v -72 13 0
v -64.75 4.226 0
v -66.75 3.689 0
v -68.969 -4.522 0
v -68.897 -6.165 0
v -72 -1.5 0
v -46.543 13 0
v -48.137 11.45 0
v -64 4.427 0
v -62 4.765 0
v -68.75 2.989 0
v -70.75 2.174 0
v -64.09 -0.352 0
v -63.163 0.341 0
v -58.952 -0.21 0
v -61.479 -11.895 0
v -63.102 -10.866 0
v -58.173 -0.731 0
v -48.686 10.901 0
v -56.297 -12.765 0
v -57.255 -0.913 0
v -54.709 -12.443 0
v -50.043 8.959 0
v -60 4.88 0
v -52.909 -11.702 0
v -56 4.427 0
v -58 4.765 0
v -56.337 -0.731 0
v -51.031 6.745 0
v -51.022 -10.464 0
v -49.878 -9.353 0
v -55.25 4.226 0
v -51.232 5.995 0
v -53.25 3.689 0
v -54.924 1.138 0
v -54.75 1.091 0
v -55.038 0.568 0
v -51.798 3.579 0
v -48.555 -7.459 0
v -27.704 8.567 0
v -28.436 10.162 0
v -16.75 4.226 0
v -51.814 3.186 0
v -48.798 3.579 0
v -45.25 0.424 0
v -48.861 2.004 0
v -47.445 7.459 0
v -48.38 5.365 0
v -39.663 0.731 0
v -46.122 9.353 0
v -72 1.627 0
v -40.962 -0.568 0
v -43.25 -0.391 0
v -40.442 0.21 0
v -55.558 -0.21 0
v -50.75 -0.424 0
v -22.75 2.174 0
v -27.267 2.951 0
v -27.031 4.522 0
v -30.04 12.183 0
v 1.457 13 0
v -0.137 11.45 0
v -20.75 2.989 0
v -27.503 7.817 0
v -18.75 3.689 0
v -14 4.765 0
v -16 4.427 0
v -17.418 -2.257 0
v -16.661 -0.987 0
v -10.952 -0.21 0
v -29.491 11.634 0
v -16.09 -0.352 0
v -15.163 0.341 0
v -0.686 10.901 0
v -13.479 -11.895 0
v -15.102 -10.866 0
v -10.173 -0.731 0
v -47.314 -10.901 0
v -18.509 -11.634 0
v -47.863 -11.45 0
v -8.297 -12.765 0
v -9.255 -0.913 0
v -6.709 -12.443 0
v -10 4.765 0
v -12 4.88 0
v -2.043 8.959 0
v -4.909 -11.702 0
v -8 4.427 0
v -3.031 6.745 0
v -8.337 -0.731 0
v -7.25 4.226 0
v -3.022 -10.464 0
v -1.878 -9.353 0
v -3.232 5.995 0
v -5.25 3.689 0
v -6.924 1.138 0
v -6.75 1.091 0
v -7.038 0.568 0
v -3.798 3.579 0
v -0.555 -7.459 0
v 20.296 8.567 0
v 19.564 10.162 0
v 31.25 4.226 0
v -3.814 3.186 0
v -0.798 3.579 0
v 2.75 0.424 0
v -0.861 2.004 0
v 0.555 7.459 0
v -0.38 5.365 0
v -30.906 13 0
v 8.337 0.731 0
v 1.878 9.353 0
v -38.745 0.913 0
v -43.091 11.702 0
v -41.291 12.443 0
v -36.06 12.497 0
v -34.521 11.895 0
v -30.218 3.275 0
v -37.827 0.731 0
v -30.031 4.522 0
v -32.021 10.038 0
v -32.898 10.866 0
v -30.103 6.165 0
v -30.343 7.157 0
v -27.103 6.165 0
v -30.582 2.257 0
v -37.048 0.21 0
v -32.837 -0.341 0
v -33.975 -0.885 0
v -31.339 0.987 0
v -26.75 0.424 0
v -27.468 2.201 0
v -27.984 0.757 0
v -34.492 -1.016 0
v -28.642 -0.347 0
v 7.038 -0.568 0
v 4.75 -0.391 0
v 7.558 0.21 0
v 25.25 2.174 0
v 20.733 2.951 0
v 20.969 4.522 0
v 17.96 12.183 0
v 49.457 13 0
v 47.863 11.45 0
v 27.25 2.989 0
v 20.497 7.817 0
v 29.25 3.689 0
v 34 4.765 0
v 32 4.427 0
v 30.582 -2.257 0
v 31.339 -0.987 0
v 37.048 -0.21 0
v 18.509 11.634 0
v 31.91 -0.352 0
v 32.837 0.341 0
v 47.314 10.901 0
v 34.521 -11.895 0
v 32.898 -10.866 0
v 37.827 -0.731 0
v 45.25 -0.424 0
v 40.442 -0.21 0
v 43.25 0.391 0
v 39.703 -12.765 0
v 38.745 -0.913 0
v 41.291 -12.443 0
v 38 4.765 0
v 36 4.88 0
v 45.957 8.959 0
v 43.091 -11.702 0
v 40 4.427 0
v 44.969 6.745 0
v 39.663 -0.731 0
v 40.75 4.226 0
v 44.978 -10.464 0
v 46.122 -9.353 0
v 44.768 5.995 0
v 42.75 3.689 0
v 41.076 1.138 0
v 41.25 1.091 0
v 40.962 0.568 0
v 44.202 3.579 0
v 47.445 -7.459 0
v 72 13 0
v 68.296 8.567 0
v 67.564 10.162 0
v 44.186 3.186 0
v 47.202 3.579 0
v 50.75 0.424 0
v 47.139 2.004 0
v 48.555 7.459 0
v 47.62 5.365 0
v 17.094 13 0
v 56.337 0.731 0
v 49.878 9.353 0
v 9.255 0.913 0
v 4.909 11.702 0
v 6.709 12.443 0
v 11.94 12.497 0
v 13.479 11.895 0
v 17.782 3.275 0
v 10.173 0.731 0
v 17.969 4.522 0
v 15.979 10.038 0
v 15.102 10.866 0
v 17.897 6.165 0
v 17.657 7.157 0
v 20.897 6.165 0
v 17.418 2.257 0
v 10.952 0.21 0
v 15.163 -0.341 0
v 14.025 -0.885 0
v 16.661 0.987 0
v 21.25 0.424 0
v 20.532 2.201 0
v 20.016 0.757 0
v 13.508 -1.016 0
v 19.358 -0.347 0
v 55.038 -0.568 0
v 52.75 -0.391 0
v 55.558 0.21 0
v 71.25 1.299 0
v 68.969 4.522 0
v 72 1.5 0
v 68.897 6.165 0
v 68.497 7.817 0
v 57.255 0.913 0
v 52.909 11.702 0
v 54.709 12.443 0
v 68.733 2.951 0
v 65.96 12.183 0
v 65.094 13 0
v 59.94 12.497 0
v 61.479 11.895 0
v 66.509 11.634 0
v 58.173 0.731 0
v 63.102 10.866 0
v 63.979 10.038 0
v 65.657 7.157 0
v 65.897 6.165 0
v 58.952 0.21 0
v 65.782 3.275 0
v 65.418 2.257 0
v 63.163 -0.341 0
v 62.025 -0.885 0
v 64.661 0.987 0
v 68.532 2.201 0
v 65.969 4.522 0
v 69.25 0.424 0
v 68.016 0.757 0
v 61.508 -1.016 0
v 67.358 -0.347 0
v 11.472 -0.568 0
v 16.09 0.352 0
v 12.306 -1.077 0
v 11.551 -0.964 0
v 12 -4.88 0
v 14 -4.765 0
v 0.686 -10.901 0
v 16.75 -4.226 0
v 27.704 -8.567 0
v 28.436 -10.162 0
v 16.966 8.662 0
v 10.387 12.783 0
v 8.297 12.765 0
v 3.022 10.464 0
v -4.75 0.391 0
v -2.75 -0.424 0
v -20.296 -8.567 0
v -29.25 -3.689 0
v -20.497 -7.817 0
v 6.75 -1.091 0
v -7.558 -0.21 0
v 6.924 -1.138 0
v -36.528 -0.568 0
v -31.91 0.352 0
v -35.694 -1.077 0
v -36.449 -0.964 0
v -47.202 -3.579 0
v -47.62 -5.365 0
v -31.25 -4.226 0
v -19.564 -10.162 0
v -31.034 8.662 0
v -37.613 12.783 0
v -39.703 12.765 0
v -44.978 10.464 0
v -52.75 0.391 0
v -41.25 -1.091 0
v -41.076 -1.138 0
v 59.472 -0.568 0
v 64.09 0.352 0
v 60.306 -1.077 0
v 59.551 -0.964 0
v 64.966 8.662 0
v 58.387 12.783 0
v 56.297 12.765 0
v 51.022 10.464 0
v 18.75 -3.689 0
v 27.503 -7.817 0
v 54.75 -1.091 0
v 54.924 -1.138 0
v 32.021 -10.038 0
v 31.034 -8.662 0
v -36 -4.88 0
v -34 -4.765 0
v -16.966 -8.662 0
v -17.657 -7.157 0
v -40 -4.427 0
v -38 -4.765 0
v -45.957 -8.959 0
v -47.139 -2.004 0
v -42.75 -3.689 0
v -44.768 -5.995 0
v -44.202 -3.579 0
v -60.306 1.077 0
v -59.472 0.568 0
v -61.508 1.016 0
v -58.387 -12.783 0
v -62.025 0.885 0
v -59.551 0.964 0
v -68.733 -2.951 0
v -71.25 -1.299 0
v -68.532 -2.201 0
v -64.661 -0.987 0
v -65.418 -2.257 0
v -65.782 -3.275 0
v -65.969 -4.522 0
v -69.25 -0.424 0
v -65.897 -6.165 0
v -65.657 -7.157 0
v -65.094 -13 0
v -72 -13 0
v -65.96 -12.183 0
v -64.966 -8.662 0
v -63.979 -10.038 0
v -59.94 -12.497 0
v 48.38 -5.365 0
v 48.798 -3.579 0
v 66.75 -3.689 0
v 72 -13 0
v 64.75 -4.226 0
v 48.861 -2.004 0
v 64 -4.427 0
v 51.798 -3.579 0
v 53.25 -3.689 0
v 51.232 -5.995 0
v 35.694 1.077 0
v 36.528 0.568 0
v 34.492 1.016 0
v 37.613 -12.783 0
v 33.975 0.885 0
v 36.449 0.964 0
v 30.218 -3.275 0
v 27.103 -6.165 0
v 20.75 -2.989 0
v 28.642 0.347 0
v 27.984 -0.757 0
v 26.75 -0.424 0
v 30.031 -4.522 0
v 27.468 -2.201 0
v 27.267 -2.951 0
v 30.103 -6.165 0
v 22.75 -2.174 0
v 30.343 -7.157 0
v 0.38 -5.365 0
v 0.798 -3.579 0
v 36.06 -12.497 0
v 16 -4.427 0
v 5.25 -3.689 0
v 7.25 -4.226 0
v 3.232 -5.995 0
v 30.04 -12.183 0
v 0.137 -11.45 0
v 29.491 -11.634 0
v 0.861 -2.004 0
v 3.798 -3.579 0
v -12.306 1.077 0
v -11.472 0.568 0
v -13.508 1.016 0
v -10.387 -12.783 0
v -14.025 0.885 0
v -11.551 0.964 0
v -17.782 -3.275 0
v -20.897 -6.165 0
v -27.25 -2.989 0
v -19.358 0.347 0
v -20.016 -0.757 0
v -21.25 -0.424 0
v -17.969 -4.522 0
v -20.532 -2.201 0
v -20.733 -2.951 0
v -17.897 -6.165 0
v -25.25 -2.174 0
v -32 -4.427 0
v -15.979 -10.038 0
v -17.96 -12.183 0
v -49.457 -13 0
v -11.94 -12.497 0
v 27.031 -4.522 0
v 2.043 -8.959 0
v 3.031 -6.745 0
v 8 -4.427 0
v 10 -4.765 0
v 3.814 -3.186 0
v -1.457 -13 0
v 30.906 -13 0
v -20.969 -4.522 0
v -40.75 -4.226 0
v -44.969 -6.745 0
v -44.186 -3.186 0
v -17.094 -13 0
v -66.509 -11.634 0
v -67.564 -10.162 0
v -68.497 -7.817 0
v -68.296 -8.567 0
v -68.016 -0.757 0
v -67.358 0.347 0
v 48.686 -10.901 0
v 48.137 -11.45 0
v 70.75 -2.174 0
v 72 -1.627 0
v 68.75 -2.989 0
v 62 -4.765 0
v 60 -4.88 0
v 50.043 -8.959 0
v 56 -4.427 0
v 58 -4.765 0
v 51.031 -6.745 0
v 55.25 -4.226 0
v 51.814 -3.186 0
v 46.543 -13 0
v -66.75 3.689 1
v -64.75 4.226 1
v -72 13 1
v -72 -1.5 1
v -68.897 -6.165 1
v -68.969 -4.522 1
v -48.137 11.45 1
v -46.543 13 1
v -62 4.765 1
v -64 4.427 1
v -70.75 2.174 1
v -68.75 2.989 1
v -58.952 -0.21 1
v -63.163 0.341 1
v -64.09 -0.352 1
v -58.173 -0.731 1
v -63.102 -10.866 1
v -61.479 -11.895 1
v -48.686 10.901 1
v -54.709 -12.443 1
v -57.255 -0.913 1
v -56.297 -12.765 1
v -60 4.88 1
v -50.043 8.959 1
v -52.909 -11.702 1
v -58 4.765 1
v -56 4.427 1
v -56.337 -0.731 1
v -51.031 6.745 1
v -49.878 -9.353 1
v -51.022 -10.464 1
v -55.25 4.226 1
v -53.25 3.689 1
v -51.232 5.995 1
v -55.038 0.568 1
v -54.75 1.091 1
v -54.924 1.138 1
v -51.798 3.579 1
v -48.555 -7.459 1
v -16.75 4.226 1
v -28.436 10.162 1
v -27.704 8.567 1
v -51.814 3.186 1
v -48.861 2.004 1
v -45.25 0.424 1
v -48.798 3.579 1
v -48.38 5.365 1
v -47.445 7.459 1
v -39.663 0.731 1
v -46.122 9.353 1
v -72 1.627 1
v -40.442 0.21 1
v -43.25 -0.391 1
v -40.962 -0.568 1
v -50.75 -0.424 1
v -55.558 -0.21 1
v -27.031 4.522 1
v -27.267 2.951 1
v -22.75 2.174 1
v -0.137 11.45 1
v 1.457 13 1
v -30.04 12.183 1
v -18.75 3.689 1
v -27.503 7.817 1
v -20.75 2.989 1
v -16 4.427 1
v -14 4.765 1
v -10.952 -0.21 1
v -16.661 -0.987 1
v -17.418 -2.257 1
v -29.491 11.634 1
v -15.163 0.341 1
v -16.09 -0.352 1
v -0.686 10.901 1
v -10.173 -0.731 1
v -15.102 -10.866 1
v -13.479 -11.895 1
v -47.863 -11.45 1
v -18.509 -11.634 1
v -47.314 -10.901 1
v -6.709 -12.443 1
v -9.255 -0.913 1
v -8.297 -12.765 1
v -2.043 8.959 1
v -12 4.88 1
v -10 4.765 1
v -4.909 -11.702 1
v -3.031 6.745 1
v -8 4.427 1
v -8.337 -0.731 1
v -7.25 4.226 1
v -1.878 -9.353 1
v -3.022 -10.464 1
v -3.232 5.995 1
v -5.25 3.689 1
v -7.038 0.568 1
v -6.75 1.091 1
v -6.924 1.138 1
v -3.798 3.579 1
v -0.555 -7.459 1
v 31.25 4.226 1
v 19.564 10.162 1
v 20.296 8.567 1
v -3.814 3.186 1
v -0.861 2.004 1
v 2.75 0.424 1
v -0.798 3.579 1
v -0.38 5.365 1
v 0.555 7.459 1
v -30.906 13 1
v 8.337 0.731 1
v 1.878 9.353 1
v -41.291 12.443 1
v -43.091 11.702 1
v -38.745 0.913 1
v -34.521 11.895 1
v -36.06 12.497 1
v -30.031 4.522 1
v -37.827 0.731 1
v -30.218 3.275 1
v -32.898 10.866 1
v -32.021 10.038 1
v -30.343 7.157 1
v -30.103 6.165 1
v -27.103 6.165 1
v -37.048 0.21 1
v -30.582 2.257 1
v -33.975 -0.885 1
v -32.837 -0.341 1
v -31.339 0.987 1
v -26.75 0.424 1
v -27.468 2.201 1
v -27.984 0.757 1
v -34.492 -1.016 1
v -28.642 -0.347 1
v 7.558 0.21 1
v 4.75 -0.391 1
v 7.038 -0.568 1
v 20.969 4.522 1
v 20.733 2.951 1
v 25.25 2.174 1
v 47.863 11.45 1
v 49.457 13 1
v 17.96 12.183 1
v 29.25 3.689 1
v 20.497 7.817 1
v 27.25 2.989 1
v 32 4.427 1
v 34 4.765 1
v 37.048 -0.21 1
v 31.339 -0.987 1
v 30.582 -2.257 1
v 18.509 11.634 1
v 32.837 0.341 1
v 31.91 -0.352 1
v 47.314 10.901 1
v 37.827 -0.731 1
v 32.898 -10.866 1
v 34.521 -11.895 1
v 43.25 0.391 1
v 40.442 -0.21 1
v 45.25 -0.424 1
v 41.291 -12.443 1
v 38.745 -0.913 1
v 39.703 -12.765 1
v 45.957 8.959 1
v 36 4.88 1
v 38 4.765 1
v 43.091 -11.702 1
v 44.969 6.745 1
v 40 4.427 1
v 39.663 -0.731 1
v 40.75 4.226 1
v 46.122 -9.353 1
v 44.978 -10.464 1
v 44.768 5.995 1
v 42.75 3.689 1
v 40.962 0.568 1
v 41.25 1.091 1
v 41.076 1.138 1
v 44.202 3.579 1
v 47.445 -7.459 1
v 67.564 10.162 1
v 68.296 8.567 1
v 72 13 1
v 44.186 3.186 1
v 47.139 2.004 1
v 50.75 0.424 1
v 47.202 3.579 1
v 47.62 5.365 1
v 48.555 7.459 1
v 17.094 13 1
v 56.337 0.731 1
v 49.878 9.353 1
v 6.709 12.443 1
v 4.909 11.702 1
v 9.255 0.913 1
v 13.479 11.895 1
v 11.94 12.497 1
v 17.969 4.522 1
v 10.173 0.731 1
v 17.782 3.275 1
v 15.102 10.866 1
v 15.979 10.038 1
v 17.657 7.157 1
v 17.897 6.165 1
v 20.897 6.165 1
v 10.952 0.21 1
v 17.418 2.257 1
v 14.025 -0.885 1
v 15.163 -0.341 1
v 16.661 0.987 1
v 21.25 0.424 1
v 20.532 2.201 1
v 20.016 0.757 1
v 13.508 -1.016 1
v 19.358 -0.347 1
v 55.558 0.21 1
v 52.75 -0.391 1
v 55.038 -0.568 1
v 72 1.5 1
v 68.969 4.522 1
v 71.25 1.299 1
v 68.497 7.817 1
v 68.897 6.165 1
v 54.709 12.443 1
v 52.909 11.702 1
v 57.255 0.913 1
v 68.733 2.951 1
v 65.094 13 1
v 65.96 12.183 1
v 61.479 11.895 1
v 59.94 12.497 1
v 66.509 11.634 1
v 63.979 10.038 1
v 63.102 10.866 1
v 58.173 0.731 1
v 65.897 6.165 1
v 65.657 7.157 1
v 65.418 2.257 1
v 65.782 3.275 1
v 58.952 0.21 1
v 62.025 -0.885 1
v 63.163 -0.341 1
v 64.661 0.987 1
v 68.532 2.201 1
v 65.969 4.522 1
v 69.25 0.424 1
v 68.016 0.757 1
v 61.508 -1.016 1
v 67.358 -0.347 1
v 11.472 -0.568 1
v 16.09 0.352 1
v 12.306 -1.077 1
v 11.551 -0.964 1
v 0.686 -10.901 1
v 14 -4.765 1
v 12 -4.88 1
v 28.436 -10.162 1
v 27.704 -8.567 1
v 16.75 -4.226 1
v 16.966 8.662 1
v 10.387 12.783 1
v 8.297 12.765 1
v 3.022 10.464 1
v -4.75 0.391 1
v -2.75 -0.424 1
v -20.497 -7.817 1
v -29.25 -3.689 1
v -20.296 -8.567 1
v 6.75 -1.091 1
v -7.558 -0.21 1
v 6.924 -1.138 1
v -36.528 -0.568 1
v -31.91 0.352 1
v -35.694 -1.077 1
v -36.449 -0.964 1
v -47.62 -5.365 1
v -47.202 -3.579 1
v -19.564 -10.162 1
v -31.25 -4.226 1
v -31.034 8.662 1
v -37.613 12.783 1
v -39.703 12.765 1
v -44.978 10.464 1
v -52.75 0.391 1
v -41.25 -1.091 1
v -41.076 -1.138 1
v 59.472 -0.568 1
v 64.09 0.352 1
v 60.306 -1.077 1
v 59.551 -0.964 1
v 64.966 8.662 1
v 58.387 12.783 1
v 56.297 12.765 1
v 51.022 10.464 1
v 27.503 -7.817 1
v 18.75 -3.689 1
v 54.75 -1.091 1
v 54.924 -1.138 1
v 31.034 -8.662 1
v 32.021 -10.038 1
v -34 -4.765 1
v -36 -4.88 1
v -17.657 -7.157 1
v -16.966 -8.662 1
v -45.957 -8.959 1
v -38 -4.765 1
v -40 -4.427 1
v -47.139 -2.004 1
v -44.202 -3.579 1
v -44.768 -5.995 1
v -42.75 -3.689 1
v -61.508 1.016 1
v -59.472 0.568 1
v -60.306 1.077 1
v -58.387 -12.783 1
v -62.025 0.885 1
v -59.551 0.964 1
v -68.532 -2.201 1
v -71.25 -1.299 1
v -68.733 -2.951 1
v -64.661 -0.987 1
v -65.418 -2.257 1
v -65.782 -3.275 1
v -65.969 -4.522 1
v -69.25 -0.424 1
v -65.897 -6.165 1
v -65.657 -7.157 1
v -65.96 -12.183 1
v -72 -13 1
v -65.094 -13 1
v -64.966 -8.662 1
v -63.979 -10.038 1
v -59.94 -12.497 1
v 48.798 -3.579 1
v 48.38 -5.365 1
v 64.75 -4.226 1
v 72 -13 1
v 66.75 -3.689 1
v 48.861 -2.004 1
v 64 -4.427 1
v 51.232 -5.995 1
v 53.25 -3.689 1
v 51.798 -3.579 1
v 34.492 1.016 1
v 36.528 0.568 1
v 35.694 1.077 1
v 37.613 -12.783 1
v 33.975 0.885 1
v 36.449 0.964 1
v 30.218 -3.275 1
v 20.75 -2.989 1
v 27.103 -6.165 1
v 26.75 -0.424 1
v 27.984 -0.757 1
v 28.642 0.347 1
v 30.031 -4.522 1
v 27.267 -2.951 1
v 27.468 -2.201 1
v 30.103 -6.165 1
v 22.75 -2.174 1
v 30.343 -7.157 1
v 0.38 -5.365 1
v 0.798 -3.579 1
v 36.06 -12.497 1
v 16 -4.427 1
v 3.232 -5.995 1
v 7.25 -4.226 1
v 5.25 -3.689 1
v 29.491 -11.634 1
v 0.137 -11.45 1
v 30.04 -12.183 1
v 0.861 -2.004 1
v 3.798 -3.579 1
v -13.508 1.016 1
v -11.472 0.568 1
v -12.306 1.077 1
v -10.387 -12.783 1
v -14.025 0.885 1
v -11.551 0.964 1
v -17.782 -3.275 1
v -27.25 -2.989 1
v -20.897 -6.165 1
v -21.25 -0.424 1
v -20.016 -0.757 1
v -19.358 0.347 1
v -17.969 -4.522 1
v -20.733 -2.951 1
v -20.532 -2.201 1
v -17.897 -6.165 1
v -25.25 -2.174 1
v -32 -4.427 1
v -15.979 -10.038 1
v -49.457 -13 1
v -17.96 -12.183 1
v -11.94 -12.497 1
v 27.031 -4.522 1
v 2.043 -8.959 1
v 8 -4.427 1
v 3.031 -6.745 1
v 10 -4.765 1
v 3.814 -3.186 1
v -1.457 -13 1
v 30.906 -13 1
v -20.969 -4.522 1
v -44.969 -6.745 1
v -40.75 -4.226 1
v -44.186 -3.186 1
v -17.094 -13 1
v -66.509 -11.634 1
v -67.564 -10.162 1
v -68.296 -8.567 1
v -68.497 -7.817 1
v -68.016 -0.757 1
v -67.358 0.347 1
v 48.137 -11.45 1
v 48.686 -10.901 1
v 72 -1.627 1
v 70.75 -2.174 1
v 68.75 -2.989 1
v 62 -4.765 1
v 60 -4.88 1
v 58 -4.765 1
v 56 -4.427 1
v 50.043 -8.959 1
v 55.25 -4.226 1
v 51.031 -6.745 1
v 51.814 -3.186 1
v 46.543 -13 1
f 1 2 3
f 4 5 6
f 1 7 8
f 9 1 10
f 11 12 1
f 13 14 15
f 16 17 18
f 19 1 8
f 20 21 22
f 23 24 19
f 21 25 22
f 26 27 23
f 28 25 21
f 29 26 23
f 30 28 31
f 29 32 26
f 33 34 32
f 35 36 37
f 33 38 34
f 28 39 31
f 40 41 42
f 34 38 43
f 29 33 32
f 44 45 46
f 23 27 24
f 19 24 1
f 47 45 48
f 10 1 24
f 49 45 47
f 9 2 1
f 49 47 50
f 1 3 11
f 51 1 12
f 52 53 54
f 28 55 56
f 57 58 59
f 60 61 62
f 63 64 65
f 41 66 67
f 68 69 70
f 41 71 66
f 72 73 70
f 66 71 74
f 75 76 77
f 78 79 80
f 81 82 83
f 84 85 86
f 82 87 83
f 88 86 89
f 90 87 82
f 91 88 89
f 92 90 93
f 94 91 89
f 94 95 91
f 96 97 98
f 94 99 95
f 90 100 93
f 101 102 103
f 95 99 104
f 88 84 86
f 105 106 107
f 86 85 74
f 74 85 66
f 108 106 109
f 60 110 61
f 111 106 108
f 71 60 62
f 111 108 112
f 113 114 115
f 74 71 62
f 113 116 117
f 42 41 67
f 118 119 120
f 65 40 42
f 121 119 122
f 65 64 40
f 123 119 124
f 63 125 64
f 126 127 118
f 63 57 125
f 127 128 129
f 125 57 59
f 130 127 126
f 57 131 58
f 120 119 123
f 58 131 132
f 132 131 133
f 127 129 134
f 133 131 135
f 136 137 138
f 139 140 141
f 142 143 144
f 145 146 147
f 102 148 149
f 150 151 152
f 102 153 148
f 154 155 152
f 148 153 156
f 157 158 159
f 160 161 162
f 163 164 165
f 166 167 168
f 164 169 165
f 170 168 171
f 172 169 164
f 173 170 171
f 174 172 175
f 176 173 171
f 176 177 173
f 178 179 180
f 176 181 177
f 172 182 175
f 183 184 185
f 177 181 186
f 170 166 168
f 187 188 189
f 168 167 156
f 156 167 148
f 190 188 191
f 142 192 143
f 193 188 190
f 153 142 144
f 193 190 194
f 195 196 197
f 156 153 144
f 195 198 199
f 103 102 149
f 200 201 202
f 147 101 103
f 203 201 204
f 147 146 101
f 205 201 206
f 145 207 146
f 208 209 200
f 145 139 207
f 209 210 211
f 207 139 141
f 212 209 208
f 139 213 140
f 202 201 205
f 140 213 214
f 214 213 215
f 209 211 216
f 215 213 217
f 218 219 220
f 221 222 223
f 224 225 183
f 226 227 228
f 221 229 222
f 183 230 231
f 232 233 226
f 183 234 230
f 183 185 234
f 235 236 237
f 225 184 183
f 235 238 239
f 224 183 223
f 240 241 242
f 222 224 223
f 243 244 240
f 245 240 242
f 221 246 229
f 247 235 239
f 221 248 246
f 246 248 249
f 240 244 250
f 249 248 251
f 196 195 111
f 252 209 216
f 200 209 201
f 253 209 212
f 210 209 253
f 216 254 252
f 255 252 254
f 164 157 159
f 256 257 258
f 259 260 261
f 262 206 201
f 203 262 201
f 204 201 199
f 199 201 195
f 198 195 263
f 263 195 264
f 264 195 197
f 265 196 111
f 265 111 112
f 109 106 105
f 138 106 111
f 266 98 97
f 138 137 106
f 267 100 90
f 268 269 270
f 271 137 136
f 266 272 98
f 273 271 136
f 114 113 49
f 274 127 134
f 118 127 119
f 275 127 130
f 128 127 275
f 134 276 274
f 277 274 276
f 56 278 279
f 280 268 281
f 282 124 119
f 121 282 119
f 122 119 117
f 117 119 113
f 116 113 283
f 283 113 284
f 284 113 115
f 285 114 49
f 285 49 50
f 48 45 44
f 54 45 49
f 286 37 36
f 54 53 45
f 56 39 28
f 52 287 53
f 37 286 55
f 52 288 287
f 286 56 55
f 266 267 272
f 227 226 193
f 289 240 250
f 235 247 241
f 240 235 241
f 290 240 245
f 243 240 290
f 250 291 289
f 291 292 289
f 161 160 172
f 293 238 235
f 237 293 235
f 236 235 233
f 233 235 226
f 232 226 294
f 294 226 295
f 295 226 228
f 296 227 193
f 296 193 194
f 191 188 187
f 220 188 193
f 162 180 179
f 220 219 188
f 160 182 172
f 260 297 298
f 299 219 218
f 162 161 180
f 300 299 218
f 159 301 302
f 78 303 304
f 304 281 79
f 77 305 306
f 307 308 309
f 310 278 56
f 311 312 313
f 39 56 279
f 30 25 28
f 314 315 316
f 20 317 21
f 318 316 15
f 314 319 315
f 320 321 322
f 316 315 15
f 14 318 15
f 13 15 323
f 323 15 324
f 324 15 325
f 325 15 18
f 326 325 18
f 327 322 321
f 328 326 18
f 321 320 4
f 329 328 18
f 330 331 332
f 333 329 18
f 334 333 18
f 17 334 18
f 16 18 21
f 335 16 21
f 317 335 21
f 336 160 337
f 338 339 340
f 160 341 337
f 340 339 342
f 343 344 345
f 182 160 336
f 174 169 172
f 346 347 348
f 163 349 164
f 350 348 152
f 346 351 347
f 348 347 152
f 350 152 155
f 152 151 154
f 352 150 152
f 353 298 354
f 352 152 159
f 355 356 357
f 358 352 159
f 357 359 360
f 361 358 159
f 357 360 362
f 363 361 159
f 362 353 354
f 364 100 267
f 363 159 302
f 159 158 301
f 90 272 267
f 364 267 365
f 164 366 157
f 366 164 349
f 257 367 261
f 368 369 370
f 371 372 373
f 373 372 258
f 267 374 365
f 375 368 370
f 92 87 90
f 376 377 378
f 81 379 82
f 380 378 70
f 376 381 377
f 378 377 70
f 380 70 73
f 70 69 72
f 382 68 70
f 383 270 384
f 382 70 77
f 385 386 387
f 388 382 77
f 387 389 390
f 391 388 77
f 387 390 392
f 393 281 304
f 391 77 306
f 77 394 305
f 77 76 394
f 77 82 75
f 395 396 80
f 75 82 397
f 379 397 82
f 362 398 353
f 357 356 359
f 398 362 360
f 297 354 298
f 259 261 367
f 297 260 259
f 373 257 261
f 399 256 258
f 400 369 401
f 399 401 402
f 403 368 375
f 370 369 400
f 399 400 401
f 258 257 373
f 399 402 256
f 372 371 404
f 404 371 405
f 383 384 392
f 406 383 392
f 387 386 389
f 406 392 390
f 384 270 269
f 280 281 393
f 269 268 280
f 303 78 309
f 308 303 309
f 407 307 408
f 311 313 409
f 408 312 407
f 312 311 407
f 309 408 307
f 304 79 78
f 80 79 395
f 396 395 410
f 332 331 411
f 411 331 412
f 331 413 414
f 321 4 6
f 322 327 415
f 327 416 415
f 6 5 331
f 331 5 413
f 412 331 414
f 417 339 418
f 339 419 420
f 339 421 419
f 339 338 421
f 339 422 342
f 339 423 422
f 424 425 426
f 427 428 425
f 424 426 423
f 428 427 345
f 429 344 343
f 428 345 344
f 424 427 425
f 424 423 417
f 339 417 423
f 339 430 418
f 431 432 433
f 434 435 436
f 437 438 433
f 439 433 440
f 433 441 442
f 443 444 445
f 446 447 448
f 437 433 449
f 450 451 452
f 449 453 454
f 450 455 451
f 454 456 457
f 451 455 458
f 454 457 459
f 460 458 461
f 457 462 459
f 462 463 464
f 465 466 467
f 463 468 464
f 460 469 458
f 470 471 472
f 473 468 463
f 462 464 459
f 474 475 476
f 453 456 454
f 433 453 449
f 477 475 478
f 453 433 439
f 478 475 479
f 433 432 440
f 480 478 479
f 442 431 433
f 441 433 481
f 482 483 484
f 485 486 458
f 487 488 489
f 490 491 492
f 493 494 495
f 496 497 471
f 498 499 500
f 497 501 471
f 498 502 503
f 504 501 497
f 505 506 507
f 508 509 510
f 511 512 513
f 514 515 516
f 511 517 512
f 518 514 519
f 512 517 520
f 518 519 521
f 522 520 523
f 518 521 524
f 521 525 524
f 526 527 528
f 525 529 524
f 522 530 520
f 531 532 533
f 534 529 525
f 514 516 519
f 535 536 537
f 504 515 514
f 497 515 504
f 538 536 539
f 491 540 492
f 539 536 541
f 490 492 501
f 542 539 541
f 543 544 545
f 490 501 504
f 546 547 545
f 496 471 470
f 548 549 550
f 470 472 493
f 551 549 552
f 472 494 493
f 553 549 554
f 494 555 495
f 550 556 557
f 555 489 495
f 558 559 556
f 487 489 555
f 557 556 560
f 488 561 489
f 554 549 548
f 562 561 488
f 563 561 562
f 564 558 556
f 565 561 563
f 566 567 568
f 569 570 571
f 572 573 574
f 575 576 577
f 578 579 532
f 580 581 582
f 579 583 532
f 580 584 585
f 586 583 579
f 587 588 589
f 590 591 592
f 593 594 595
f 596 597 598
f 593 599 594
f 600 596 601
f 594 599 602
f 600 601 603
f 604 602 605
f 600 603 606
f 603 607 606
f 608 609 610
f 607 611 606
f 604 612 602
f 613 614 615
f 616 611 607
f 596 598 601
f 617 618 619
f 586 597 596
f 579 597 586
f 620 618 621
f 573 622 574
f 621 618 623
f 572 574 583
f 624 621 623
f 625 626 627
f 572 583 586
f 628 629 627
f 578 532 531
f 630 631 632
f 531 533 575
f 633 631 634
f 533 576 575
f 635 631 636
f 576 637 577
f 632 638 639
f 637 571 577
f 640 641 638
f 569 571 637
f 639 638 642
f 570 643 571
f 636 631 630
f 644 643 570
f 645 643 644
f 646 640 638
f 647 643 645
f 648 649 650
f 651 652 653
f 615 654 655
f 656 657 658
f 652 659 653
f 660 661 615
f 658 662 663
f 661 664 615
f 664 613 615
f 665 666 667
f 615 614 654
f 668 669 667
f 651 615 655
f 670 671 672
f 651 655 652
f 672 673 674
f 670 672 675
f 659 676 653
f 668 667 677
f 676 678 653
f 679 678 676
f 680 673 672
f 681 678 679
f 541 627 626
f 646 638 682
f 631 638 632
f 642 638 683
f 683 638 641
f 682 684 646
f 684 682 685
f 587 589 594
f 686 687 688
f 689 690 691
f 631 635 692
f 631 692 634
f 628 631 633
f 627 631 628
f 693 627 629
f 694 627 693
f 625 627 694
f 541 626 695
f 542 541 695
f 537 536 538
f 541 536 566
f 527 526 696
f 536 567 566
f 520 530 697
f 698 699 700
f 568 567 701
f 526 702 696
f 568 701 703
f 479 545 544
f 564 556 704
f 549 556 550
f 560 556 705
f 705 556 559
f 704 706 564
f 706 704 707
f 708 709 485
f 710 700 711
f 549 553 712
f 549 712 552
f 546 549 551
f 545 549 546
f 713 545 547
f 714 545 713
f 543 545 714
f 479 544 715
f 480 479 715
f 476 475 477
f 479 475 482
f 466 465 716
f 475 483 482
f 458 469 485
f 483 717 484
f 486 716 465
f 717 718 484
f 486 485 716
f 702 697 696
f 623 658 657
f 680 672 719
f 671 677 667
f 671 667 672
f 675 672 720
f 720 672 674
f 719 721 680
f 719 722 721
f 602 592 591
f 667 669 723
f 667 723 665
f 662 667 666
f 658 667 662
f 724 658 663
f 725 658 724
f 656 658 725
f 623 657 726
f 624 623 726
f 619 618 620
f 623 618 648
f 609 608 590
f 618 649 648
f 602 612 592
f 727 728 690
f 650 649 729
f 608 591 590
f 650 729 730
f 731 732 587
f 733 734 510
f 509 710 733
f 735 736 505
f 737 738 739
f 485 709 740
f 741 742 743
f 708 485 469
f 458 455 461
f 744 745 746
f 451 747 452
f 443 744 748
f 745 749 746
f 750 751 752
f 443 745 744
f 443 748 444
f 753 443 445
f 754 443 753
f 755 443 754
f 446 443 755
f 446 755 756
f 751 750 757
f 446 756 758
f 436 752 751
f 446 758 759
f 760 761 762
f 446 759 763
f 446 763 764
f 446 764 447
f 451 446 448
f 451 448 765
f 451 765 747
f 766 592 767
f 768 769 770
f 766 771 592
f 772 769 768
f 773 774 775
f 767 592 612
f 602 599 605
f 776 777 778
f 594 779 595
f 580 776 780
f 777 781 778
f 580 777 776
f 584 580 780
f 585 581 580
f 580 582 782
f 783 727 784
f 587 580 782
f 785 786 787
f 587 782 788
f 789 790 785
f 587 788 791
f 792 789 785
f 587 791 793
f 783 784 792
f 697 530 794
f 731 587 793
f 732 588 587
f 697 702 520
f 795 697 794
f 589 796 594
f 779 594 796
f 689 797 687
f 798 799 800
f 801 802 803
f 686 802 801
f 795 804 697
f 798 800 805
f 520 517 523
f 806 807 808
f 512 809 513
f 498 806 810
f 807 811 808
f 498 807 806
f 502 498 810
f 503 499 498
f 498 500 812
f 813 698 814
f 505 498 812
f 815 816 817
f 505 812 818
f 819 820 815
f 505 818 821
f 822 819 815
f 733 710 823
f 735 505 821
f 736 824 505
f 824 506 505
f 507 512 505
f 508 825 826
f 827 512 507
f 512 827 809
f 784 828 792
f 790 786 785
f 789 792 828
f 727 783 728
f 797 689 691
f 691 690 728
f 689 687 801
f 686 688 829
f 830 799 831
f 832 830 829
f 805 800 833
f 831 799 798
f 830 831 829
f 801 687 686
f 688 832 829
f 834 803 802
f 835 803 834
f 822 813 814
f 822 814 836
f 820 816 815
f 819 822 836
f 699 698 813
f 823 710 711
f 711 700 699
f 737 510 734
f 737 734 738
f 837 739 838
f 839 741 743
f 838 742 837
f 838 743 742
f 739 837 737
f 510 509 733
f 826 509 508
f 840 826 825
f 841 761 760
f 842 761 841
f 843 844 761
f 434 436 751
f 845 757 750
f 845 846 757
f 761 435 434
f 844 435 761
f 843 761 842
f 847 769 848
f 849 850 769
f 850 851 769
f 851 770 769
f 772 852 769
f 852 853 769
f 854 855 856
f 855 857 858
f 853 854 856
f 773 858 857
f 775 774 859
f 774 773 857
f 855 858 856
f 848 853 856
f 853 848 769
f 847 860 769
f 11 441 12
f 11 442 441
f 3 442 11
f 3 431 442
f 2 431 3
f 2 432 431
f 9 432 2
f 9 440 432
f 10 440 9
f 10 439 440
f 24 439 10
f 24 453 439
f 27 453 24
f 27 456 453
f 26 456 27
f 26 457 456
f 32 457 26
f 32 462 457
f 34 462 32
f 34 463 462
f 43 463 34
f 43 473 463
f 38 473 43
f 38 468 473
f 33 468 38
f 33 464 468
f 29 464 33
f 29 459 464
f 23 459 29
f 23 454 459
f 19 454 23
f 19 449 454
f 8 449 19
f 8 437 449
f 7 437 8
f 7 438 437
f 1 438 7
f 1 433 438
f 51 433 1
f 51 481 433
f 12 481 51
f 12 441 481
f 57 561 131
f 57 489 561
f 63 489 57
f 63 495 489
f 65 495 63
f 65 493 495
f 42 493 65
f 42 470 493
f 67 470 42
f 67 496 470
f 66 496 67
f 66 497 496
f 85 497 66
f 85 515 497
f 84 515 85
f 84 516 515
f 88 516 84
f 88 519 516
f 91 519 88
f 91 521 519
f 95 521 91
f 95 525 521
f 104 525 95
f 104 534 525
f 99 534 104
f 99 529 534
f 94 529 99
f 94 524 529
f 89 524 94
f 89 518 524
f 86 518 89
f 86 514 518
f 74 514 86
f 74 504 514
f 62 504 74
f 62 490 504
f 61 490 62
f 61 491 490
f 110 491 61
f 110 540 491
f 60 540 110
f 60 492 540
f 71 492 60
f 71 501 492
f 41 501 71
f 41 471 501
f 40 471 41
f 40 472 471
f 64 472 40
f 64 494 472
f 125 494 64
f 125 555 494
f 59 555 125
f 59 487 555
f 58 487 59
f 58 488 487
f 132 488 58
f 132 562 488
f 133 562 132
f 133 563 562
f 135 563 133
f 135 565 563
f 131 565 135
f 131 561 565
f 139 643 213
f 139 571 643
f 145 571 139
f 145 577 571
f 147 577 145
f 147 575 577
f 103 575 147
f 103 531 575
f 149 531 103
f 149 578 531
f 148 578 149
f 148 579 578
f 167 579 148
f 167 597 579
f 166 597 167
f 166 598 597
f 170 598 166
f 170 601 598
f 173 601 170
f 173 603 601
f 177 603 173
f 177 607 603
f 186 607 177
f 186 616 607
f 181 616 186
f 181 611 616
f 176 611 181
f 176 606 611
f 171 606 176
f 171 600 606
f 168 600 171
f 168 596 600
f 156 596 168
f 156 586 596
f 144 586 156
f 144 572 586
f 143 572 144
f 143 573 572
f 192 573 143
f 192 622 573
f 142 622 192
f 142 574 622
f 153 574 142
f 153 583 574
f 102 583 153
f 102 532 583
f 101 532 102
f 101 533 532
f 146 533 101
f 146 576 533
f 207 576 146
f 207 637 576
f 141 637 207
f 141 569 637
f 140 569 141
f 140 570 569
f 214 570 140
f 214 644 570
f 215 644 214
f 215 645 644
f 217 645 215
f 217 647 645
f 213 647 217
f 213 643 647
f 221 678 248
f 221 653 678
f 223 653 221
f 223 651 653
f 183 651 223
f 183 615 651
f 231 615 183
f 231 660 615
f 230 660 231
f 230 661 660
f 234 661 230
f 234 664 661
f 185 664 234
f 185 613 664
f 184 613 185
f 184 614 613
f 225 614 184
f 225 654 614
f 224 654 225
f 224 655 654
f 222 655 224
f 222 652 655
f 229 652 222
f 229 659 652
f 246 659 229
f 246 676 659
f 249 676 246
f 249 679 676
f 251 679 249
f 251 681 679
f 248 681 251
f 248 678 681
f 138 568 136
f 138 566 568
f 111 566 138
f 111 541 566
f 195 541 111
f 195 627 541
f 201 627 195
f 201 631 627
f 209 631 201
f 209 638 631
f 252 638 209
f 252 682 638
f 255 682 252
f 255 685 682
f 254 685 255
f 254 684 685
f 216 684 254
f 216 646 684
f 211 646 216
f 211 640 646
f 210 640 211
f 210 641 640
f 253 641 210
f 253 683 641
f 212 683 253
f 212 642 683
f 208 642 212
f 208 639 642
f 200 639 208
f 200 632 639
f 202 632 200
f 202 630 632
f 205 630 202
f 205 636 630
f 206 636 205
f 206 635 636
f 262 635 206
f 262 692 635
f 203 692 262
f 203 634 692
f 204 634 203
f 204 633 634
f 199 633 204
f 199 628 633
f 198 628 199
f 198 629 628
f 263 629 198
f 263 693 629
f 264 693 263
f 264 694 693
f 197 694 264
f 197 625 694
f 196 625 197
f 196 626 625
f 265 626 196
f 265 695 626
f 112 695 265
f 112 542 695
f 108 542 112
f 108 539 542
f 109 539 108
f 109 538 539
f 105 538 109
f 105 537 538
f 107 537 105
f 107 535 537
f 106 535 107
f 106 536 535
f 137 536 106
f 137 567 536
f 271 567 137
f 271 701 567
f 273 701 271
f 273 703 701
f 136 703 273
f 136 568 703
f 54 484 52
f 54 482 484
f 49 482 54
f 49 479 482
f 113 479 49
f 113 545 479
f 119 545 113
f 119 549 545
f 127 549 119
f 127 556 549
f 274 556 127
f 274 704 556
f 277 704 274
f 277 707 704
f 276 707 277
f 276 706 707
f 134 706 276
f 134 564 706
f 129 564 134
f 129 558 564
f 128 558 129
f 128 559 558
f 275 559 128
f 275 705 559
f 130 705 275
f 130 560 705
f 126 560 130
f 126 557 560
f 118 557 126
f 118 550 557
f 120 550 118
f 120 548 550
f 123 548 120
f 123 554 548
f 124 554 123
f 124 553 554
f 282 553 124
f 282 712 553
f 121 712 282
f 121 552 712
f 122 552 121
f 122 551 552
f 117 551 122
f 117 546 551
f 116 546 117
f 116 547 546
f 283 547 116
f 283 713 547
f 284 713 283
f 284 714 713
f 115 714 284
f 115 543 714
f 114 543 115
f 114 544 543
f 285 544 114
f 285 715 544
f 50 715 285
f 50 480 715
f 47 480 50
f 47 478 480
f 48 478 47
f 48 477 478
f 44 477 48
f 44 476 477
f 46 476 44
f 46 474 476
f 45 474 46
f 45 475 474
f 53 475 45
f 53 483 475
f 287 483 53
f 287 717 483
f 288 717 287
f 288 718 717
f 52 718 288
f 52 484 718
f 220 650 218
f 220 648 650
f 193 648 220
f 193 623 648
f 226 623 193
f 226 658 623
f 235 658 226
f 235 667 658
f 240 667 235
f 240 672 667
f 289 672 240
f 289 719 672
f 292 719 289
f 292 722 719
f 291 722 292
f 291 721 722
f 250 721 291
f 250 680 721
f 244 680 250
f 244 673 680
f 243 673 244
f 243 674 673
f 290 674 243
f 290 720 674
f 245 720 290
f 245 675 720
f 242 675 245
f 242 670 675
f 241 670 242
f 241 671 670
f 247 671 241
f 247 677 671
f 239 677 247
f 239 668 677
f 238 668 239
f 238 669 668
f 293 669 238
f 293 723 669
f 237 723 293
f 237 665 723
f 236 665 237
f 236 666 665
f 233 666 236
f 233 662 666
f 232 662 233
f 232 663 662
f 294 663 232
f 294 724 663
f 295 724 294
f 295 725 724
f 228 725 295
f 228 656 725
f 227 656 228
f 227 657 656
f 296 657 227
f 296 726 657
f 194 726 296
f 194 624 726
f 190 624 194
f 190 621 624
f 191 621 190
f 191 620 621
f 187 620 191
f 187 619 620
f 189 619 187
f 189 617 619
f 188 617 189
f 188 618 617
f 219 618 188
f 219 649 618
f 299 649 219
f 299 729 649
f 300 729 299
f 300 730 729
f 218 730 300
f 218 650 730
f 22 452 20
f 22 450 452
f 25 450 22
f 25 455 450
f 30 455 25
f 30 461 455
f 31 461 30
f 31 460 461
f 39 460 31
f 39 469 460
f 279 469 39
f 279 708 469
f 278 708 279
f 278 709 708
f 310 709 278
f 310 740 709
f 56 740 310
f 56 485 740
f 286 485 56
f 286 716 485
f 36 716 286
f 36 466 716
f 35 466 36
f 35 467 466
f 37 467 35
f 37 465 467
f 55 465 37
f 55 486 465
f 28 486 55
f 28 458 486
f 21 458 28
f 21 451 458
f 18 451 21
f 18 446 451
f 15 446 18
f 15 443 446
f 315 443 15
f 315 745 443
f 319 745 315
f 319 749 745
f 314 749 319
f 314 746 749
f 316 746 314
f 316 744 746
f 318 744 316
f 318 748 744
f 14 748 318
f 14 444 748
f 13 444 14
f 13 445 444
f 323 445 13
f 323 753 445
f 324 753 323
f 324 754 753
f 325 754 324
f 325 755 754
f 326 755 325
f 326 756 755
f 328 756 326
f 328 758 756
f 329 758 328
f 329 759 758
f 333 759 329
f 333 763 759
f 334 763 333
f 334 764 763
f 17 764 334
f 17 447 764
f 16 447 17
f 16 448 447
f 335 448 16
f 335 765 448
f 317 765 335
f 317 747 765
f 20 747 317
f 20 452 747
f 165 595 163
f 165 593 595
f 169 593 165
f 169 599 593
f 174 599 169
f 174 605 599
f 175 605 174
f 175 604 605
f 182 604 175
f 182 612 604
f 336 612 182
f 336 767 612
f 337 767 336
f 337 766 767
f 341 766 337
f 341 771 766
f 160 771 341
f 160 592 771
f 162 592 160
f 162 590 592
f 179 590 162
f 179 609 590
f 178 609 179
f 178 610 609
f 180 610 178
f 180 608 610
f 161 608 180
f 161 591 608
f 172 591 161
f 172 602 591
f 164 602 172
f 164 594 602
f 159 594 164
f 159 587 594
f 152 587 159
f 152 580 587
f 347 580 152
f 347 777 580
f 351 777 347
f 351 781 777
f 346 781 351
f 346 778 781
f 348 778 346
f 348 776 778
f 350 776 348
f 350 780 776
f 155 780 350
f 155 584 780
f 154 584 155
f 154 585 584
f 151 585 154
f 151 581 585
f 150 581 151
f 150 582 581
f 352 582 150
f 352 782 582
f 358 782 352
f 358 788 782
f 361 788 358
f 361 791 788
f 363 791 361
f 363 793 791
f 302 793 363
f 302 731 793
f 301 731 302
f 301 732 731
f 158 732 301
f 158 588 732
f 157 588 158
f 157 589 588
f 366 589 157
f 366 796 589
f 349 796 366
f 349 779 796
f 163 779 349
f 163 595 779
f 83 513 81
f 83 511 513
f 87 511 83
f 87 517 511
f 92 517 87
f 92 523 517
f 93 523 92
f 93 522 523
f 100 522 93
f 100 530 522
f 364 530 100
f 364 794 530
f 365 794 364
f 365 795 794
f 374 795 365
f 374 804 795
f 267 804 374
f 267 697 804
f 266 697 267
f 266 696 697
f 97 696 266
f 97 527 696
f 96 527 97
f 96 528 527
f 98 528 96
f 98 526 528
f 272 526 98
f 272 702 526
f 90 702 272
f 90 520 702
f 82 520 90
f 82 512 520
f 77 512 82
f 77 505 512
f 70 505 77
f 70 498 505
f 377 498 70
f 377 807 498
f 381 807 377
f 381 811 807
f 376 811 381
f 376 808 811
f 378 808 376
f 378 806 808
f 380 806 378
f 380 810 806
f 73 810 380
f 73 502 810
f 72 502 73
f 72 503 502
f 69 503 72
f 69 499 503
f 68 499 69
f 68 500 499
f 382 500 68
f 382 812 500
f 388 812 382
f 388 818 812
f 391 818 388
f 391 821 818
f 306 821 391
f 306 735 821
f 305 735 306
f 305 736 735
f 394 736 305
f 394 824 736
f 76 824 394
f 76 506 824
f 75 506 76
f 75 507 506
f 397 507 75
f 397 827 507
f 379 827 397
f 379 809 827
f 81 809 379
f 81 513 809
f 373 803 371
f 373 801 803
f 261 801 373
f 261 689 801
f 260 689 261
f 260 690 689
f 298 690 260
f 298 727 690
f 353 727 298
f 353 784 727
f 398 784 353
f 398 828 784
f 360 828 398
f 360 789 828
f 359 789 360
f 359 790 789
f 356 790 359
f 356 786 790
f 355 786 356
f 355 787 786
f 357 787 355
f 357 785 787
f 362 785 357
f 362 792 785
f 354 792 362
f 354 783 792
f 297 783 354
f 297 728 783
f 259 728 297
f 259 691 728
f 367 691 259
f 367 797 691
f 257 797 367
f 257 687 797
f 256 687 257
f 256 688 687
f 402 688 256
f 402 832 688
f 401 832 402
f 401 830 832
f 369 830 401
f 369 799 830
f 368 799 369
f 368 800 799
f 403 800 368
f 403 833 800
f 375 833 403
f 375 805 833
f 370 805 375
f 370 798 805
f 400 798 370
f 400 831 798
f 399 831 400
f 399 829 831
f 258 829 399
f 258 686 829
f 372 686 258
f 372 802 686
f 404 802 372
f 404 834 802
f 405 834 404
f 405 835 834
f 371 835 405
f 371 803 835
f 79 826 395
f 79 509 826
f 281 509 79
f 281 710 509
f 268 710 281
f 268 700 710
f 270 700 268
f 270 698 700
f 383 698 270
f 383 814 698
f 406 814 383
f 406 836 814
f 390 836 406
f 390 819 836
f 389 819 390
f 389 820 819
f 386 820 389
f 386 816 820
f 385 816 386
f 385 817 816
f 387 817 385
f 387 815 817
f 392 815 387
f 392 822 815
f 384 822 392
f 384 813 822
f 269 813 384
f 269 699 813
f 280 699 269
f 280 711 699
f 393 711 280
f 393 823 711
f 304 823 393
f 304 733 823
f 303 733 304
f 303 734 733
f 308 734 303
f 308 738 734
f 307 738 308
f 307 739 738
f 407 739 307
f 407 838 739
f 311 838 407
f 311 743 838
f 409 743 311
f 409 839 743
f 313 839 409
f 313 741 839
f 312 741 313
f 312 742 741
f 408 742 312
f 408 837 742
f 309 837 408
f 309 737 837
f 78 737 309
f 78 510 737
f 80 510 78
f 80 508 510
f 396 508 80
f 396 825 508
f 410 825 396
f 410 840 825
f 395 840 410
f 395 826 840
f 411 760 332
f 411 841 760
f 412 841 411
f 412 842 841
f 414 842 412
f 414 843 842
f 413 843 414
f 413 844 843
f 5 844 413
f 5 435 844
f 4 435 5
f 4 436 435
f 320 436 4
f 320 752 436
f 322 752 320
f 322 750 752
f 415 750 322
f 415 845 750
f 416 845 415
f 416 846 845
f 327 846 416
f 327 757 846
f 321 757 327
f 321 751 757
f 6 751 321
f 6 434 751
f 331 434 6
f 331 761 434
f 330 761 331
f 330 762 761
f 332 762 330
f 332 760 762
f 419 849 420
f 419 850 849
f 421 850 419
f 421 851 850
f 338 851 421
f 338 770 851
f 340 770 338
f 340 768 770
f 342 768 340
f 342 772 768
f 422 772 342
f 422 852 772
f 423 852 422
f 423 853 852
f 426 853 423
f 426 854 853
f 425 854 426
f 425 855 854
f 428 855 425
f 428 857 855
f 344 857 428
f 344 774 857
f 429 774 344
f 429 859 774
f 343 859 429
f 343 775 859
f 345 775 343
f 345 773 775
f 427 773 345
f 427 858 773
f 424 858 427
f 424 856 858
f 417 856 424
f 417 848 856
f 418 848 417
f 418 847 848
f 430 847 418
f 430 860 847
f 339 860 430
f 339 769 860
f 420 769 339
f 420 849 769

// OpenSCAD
include <winged_helmet.scad>
part="none";
color("gold") linear_extrude(1) difference(){ translate([-72,-13]) square([144,26]); for(i=[-1:1]) translate([i*48,0]) scroll2d(48, 26, 3); }
